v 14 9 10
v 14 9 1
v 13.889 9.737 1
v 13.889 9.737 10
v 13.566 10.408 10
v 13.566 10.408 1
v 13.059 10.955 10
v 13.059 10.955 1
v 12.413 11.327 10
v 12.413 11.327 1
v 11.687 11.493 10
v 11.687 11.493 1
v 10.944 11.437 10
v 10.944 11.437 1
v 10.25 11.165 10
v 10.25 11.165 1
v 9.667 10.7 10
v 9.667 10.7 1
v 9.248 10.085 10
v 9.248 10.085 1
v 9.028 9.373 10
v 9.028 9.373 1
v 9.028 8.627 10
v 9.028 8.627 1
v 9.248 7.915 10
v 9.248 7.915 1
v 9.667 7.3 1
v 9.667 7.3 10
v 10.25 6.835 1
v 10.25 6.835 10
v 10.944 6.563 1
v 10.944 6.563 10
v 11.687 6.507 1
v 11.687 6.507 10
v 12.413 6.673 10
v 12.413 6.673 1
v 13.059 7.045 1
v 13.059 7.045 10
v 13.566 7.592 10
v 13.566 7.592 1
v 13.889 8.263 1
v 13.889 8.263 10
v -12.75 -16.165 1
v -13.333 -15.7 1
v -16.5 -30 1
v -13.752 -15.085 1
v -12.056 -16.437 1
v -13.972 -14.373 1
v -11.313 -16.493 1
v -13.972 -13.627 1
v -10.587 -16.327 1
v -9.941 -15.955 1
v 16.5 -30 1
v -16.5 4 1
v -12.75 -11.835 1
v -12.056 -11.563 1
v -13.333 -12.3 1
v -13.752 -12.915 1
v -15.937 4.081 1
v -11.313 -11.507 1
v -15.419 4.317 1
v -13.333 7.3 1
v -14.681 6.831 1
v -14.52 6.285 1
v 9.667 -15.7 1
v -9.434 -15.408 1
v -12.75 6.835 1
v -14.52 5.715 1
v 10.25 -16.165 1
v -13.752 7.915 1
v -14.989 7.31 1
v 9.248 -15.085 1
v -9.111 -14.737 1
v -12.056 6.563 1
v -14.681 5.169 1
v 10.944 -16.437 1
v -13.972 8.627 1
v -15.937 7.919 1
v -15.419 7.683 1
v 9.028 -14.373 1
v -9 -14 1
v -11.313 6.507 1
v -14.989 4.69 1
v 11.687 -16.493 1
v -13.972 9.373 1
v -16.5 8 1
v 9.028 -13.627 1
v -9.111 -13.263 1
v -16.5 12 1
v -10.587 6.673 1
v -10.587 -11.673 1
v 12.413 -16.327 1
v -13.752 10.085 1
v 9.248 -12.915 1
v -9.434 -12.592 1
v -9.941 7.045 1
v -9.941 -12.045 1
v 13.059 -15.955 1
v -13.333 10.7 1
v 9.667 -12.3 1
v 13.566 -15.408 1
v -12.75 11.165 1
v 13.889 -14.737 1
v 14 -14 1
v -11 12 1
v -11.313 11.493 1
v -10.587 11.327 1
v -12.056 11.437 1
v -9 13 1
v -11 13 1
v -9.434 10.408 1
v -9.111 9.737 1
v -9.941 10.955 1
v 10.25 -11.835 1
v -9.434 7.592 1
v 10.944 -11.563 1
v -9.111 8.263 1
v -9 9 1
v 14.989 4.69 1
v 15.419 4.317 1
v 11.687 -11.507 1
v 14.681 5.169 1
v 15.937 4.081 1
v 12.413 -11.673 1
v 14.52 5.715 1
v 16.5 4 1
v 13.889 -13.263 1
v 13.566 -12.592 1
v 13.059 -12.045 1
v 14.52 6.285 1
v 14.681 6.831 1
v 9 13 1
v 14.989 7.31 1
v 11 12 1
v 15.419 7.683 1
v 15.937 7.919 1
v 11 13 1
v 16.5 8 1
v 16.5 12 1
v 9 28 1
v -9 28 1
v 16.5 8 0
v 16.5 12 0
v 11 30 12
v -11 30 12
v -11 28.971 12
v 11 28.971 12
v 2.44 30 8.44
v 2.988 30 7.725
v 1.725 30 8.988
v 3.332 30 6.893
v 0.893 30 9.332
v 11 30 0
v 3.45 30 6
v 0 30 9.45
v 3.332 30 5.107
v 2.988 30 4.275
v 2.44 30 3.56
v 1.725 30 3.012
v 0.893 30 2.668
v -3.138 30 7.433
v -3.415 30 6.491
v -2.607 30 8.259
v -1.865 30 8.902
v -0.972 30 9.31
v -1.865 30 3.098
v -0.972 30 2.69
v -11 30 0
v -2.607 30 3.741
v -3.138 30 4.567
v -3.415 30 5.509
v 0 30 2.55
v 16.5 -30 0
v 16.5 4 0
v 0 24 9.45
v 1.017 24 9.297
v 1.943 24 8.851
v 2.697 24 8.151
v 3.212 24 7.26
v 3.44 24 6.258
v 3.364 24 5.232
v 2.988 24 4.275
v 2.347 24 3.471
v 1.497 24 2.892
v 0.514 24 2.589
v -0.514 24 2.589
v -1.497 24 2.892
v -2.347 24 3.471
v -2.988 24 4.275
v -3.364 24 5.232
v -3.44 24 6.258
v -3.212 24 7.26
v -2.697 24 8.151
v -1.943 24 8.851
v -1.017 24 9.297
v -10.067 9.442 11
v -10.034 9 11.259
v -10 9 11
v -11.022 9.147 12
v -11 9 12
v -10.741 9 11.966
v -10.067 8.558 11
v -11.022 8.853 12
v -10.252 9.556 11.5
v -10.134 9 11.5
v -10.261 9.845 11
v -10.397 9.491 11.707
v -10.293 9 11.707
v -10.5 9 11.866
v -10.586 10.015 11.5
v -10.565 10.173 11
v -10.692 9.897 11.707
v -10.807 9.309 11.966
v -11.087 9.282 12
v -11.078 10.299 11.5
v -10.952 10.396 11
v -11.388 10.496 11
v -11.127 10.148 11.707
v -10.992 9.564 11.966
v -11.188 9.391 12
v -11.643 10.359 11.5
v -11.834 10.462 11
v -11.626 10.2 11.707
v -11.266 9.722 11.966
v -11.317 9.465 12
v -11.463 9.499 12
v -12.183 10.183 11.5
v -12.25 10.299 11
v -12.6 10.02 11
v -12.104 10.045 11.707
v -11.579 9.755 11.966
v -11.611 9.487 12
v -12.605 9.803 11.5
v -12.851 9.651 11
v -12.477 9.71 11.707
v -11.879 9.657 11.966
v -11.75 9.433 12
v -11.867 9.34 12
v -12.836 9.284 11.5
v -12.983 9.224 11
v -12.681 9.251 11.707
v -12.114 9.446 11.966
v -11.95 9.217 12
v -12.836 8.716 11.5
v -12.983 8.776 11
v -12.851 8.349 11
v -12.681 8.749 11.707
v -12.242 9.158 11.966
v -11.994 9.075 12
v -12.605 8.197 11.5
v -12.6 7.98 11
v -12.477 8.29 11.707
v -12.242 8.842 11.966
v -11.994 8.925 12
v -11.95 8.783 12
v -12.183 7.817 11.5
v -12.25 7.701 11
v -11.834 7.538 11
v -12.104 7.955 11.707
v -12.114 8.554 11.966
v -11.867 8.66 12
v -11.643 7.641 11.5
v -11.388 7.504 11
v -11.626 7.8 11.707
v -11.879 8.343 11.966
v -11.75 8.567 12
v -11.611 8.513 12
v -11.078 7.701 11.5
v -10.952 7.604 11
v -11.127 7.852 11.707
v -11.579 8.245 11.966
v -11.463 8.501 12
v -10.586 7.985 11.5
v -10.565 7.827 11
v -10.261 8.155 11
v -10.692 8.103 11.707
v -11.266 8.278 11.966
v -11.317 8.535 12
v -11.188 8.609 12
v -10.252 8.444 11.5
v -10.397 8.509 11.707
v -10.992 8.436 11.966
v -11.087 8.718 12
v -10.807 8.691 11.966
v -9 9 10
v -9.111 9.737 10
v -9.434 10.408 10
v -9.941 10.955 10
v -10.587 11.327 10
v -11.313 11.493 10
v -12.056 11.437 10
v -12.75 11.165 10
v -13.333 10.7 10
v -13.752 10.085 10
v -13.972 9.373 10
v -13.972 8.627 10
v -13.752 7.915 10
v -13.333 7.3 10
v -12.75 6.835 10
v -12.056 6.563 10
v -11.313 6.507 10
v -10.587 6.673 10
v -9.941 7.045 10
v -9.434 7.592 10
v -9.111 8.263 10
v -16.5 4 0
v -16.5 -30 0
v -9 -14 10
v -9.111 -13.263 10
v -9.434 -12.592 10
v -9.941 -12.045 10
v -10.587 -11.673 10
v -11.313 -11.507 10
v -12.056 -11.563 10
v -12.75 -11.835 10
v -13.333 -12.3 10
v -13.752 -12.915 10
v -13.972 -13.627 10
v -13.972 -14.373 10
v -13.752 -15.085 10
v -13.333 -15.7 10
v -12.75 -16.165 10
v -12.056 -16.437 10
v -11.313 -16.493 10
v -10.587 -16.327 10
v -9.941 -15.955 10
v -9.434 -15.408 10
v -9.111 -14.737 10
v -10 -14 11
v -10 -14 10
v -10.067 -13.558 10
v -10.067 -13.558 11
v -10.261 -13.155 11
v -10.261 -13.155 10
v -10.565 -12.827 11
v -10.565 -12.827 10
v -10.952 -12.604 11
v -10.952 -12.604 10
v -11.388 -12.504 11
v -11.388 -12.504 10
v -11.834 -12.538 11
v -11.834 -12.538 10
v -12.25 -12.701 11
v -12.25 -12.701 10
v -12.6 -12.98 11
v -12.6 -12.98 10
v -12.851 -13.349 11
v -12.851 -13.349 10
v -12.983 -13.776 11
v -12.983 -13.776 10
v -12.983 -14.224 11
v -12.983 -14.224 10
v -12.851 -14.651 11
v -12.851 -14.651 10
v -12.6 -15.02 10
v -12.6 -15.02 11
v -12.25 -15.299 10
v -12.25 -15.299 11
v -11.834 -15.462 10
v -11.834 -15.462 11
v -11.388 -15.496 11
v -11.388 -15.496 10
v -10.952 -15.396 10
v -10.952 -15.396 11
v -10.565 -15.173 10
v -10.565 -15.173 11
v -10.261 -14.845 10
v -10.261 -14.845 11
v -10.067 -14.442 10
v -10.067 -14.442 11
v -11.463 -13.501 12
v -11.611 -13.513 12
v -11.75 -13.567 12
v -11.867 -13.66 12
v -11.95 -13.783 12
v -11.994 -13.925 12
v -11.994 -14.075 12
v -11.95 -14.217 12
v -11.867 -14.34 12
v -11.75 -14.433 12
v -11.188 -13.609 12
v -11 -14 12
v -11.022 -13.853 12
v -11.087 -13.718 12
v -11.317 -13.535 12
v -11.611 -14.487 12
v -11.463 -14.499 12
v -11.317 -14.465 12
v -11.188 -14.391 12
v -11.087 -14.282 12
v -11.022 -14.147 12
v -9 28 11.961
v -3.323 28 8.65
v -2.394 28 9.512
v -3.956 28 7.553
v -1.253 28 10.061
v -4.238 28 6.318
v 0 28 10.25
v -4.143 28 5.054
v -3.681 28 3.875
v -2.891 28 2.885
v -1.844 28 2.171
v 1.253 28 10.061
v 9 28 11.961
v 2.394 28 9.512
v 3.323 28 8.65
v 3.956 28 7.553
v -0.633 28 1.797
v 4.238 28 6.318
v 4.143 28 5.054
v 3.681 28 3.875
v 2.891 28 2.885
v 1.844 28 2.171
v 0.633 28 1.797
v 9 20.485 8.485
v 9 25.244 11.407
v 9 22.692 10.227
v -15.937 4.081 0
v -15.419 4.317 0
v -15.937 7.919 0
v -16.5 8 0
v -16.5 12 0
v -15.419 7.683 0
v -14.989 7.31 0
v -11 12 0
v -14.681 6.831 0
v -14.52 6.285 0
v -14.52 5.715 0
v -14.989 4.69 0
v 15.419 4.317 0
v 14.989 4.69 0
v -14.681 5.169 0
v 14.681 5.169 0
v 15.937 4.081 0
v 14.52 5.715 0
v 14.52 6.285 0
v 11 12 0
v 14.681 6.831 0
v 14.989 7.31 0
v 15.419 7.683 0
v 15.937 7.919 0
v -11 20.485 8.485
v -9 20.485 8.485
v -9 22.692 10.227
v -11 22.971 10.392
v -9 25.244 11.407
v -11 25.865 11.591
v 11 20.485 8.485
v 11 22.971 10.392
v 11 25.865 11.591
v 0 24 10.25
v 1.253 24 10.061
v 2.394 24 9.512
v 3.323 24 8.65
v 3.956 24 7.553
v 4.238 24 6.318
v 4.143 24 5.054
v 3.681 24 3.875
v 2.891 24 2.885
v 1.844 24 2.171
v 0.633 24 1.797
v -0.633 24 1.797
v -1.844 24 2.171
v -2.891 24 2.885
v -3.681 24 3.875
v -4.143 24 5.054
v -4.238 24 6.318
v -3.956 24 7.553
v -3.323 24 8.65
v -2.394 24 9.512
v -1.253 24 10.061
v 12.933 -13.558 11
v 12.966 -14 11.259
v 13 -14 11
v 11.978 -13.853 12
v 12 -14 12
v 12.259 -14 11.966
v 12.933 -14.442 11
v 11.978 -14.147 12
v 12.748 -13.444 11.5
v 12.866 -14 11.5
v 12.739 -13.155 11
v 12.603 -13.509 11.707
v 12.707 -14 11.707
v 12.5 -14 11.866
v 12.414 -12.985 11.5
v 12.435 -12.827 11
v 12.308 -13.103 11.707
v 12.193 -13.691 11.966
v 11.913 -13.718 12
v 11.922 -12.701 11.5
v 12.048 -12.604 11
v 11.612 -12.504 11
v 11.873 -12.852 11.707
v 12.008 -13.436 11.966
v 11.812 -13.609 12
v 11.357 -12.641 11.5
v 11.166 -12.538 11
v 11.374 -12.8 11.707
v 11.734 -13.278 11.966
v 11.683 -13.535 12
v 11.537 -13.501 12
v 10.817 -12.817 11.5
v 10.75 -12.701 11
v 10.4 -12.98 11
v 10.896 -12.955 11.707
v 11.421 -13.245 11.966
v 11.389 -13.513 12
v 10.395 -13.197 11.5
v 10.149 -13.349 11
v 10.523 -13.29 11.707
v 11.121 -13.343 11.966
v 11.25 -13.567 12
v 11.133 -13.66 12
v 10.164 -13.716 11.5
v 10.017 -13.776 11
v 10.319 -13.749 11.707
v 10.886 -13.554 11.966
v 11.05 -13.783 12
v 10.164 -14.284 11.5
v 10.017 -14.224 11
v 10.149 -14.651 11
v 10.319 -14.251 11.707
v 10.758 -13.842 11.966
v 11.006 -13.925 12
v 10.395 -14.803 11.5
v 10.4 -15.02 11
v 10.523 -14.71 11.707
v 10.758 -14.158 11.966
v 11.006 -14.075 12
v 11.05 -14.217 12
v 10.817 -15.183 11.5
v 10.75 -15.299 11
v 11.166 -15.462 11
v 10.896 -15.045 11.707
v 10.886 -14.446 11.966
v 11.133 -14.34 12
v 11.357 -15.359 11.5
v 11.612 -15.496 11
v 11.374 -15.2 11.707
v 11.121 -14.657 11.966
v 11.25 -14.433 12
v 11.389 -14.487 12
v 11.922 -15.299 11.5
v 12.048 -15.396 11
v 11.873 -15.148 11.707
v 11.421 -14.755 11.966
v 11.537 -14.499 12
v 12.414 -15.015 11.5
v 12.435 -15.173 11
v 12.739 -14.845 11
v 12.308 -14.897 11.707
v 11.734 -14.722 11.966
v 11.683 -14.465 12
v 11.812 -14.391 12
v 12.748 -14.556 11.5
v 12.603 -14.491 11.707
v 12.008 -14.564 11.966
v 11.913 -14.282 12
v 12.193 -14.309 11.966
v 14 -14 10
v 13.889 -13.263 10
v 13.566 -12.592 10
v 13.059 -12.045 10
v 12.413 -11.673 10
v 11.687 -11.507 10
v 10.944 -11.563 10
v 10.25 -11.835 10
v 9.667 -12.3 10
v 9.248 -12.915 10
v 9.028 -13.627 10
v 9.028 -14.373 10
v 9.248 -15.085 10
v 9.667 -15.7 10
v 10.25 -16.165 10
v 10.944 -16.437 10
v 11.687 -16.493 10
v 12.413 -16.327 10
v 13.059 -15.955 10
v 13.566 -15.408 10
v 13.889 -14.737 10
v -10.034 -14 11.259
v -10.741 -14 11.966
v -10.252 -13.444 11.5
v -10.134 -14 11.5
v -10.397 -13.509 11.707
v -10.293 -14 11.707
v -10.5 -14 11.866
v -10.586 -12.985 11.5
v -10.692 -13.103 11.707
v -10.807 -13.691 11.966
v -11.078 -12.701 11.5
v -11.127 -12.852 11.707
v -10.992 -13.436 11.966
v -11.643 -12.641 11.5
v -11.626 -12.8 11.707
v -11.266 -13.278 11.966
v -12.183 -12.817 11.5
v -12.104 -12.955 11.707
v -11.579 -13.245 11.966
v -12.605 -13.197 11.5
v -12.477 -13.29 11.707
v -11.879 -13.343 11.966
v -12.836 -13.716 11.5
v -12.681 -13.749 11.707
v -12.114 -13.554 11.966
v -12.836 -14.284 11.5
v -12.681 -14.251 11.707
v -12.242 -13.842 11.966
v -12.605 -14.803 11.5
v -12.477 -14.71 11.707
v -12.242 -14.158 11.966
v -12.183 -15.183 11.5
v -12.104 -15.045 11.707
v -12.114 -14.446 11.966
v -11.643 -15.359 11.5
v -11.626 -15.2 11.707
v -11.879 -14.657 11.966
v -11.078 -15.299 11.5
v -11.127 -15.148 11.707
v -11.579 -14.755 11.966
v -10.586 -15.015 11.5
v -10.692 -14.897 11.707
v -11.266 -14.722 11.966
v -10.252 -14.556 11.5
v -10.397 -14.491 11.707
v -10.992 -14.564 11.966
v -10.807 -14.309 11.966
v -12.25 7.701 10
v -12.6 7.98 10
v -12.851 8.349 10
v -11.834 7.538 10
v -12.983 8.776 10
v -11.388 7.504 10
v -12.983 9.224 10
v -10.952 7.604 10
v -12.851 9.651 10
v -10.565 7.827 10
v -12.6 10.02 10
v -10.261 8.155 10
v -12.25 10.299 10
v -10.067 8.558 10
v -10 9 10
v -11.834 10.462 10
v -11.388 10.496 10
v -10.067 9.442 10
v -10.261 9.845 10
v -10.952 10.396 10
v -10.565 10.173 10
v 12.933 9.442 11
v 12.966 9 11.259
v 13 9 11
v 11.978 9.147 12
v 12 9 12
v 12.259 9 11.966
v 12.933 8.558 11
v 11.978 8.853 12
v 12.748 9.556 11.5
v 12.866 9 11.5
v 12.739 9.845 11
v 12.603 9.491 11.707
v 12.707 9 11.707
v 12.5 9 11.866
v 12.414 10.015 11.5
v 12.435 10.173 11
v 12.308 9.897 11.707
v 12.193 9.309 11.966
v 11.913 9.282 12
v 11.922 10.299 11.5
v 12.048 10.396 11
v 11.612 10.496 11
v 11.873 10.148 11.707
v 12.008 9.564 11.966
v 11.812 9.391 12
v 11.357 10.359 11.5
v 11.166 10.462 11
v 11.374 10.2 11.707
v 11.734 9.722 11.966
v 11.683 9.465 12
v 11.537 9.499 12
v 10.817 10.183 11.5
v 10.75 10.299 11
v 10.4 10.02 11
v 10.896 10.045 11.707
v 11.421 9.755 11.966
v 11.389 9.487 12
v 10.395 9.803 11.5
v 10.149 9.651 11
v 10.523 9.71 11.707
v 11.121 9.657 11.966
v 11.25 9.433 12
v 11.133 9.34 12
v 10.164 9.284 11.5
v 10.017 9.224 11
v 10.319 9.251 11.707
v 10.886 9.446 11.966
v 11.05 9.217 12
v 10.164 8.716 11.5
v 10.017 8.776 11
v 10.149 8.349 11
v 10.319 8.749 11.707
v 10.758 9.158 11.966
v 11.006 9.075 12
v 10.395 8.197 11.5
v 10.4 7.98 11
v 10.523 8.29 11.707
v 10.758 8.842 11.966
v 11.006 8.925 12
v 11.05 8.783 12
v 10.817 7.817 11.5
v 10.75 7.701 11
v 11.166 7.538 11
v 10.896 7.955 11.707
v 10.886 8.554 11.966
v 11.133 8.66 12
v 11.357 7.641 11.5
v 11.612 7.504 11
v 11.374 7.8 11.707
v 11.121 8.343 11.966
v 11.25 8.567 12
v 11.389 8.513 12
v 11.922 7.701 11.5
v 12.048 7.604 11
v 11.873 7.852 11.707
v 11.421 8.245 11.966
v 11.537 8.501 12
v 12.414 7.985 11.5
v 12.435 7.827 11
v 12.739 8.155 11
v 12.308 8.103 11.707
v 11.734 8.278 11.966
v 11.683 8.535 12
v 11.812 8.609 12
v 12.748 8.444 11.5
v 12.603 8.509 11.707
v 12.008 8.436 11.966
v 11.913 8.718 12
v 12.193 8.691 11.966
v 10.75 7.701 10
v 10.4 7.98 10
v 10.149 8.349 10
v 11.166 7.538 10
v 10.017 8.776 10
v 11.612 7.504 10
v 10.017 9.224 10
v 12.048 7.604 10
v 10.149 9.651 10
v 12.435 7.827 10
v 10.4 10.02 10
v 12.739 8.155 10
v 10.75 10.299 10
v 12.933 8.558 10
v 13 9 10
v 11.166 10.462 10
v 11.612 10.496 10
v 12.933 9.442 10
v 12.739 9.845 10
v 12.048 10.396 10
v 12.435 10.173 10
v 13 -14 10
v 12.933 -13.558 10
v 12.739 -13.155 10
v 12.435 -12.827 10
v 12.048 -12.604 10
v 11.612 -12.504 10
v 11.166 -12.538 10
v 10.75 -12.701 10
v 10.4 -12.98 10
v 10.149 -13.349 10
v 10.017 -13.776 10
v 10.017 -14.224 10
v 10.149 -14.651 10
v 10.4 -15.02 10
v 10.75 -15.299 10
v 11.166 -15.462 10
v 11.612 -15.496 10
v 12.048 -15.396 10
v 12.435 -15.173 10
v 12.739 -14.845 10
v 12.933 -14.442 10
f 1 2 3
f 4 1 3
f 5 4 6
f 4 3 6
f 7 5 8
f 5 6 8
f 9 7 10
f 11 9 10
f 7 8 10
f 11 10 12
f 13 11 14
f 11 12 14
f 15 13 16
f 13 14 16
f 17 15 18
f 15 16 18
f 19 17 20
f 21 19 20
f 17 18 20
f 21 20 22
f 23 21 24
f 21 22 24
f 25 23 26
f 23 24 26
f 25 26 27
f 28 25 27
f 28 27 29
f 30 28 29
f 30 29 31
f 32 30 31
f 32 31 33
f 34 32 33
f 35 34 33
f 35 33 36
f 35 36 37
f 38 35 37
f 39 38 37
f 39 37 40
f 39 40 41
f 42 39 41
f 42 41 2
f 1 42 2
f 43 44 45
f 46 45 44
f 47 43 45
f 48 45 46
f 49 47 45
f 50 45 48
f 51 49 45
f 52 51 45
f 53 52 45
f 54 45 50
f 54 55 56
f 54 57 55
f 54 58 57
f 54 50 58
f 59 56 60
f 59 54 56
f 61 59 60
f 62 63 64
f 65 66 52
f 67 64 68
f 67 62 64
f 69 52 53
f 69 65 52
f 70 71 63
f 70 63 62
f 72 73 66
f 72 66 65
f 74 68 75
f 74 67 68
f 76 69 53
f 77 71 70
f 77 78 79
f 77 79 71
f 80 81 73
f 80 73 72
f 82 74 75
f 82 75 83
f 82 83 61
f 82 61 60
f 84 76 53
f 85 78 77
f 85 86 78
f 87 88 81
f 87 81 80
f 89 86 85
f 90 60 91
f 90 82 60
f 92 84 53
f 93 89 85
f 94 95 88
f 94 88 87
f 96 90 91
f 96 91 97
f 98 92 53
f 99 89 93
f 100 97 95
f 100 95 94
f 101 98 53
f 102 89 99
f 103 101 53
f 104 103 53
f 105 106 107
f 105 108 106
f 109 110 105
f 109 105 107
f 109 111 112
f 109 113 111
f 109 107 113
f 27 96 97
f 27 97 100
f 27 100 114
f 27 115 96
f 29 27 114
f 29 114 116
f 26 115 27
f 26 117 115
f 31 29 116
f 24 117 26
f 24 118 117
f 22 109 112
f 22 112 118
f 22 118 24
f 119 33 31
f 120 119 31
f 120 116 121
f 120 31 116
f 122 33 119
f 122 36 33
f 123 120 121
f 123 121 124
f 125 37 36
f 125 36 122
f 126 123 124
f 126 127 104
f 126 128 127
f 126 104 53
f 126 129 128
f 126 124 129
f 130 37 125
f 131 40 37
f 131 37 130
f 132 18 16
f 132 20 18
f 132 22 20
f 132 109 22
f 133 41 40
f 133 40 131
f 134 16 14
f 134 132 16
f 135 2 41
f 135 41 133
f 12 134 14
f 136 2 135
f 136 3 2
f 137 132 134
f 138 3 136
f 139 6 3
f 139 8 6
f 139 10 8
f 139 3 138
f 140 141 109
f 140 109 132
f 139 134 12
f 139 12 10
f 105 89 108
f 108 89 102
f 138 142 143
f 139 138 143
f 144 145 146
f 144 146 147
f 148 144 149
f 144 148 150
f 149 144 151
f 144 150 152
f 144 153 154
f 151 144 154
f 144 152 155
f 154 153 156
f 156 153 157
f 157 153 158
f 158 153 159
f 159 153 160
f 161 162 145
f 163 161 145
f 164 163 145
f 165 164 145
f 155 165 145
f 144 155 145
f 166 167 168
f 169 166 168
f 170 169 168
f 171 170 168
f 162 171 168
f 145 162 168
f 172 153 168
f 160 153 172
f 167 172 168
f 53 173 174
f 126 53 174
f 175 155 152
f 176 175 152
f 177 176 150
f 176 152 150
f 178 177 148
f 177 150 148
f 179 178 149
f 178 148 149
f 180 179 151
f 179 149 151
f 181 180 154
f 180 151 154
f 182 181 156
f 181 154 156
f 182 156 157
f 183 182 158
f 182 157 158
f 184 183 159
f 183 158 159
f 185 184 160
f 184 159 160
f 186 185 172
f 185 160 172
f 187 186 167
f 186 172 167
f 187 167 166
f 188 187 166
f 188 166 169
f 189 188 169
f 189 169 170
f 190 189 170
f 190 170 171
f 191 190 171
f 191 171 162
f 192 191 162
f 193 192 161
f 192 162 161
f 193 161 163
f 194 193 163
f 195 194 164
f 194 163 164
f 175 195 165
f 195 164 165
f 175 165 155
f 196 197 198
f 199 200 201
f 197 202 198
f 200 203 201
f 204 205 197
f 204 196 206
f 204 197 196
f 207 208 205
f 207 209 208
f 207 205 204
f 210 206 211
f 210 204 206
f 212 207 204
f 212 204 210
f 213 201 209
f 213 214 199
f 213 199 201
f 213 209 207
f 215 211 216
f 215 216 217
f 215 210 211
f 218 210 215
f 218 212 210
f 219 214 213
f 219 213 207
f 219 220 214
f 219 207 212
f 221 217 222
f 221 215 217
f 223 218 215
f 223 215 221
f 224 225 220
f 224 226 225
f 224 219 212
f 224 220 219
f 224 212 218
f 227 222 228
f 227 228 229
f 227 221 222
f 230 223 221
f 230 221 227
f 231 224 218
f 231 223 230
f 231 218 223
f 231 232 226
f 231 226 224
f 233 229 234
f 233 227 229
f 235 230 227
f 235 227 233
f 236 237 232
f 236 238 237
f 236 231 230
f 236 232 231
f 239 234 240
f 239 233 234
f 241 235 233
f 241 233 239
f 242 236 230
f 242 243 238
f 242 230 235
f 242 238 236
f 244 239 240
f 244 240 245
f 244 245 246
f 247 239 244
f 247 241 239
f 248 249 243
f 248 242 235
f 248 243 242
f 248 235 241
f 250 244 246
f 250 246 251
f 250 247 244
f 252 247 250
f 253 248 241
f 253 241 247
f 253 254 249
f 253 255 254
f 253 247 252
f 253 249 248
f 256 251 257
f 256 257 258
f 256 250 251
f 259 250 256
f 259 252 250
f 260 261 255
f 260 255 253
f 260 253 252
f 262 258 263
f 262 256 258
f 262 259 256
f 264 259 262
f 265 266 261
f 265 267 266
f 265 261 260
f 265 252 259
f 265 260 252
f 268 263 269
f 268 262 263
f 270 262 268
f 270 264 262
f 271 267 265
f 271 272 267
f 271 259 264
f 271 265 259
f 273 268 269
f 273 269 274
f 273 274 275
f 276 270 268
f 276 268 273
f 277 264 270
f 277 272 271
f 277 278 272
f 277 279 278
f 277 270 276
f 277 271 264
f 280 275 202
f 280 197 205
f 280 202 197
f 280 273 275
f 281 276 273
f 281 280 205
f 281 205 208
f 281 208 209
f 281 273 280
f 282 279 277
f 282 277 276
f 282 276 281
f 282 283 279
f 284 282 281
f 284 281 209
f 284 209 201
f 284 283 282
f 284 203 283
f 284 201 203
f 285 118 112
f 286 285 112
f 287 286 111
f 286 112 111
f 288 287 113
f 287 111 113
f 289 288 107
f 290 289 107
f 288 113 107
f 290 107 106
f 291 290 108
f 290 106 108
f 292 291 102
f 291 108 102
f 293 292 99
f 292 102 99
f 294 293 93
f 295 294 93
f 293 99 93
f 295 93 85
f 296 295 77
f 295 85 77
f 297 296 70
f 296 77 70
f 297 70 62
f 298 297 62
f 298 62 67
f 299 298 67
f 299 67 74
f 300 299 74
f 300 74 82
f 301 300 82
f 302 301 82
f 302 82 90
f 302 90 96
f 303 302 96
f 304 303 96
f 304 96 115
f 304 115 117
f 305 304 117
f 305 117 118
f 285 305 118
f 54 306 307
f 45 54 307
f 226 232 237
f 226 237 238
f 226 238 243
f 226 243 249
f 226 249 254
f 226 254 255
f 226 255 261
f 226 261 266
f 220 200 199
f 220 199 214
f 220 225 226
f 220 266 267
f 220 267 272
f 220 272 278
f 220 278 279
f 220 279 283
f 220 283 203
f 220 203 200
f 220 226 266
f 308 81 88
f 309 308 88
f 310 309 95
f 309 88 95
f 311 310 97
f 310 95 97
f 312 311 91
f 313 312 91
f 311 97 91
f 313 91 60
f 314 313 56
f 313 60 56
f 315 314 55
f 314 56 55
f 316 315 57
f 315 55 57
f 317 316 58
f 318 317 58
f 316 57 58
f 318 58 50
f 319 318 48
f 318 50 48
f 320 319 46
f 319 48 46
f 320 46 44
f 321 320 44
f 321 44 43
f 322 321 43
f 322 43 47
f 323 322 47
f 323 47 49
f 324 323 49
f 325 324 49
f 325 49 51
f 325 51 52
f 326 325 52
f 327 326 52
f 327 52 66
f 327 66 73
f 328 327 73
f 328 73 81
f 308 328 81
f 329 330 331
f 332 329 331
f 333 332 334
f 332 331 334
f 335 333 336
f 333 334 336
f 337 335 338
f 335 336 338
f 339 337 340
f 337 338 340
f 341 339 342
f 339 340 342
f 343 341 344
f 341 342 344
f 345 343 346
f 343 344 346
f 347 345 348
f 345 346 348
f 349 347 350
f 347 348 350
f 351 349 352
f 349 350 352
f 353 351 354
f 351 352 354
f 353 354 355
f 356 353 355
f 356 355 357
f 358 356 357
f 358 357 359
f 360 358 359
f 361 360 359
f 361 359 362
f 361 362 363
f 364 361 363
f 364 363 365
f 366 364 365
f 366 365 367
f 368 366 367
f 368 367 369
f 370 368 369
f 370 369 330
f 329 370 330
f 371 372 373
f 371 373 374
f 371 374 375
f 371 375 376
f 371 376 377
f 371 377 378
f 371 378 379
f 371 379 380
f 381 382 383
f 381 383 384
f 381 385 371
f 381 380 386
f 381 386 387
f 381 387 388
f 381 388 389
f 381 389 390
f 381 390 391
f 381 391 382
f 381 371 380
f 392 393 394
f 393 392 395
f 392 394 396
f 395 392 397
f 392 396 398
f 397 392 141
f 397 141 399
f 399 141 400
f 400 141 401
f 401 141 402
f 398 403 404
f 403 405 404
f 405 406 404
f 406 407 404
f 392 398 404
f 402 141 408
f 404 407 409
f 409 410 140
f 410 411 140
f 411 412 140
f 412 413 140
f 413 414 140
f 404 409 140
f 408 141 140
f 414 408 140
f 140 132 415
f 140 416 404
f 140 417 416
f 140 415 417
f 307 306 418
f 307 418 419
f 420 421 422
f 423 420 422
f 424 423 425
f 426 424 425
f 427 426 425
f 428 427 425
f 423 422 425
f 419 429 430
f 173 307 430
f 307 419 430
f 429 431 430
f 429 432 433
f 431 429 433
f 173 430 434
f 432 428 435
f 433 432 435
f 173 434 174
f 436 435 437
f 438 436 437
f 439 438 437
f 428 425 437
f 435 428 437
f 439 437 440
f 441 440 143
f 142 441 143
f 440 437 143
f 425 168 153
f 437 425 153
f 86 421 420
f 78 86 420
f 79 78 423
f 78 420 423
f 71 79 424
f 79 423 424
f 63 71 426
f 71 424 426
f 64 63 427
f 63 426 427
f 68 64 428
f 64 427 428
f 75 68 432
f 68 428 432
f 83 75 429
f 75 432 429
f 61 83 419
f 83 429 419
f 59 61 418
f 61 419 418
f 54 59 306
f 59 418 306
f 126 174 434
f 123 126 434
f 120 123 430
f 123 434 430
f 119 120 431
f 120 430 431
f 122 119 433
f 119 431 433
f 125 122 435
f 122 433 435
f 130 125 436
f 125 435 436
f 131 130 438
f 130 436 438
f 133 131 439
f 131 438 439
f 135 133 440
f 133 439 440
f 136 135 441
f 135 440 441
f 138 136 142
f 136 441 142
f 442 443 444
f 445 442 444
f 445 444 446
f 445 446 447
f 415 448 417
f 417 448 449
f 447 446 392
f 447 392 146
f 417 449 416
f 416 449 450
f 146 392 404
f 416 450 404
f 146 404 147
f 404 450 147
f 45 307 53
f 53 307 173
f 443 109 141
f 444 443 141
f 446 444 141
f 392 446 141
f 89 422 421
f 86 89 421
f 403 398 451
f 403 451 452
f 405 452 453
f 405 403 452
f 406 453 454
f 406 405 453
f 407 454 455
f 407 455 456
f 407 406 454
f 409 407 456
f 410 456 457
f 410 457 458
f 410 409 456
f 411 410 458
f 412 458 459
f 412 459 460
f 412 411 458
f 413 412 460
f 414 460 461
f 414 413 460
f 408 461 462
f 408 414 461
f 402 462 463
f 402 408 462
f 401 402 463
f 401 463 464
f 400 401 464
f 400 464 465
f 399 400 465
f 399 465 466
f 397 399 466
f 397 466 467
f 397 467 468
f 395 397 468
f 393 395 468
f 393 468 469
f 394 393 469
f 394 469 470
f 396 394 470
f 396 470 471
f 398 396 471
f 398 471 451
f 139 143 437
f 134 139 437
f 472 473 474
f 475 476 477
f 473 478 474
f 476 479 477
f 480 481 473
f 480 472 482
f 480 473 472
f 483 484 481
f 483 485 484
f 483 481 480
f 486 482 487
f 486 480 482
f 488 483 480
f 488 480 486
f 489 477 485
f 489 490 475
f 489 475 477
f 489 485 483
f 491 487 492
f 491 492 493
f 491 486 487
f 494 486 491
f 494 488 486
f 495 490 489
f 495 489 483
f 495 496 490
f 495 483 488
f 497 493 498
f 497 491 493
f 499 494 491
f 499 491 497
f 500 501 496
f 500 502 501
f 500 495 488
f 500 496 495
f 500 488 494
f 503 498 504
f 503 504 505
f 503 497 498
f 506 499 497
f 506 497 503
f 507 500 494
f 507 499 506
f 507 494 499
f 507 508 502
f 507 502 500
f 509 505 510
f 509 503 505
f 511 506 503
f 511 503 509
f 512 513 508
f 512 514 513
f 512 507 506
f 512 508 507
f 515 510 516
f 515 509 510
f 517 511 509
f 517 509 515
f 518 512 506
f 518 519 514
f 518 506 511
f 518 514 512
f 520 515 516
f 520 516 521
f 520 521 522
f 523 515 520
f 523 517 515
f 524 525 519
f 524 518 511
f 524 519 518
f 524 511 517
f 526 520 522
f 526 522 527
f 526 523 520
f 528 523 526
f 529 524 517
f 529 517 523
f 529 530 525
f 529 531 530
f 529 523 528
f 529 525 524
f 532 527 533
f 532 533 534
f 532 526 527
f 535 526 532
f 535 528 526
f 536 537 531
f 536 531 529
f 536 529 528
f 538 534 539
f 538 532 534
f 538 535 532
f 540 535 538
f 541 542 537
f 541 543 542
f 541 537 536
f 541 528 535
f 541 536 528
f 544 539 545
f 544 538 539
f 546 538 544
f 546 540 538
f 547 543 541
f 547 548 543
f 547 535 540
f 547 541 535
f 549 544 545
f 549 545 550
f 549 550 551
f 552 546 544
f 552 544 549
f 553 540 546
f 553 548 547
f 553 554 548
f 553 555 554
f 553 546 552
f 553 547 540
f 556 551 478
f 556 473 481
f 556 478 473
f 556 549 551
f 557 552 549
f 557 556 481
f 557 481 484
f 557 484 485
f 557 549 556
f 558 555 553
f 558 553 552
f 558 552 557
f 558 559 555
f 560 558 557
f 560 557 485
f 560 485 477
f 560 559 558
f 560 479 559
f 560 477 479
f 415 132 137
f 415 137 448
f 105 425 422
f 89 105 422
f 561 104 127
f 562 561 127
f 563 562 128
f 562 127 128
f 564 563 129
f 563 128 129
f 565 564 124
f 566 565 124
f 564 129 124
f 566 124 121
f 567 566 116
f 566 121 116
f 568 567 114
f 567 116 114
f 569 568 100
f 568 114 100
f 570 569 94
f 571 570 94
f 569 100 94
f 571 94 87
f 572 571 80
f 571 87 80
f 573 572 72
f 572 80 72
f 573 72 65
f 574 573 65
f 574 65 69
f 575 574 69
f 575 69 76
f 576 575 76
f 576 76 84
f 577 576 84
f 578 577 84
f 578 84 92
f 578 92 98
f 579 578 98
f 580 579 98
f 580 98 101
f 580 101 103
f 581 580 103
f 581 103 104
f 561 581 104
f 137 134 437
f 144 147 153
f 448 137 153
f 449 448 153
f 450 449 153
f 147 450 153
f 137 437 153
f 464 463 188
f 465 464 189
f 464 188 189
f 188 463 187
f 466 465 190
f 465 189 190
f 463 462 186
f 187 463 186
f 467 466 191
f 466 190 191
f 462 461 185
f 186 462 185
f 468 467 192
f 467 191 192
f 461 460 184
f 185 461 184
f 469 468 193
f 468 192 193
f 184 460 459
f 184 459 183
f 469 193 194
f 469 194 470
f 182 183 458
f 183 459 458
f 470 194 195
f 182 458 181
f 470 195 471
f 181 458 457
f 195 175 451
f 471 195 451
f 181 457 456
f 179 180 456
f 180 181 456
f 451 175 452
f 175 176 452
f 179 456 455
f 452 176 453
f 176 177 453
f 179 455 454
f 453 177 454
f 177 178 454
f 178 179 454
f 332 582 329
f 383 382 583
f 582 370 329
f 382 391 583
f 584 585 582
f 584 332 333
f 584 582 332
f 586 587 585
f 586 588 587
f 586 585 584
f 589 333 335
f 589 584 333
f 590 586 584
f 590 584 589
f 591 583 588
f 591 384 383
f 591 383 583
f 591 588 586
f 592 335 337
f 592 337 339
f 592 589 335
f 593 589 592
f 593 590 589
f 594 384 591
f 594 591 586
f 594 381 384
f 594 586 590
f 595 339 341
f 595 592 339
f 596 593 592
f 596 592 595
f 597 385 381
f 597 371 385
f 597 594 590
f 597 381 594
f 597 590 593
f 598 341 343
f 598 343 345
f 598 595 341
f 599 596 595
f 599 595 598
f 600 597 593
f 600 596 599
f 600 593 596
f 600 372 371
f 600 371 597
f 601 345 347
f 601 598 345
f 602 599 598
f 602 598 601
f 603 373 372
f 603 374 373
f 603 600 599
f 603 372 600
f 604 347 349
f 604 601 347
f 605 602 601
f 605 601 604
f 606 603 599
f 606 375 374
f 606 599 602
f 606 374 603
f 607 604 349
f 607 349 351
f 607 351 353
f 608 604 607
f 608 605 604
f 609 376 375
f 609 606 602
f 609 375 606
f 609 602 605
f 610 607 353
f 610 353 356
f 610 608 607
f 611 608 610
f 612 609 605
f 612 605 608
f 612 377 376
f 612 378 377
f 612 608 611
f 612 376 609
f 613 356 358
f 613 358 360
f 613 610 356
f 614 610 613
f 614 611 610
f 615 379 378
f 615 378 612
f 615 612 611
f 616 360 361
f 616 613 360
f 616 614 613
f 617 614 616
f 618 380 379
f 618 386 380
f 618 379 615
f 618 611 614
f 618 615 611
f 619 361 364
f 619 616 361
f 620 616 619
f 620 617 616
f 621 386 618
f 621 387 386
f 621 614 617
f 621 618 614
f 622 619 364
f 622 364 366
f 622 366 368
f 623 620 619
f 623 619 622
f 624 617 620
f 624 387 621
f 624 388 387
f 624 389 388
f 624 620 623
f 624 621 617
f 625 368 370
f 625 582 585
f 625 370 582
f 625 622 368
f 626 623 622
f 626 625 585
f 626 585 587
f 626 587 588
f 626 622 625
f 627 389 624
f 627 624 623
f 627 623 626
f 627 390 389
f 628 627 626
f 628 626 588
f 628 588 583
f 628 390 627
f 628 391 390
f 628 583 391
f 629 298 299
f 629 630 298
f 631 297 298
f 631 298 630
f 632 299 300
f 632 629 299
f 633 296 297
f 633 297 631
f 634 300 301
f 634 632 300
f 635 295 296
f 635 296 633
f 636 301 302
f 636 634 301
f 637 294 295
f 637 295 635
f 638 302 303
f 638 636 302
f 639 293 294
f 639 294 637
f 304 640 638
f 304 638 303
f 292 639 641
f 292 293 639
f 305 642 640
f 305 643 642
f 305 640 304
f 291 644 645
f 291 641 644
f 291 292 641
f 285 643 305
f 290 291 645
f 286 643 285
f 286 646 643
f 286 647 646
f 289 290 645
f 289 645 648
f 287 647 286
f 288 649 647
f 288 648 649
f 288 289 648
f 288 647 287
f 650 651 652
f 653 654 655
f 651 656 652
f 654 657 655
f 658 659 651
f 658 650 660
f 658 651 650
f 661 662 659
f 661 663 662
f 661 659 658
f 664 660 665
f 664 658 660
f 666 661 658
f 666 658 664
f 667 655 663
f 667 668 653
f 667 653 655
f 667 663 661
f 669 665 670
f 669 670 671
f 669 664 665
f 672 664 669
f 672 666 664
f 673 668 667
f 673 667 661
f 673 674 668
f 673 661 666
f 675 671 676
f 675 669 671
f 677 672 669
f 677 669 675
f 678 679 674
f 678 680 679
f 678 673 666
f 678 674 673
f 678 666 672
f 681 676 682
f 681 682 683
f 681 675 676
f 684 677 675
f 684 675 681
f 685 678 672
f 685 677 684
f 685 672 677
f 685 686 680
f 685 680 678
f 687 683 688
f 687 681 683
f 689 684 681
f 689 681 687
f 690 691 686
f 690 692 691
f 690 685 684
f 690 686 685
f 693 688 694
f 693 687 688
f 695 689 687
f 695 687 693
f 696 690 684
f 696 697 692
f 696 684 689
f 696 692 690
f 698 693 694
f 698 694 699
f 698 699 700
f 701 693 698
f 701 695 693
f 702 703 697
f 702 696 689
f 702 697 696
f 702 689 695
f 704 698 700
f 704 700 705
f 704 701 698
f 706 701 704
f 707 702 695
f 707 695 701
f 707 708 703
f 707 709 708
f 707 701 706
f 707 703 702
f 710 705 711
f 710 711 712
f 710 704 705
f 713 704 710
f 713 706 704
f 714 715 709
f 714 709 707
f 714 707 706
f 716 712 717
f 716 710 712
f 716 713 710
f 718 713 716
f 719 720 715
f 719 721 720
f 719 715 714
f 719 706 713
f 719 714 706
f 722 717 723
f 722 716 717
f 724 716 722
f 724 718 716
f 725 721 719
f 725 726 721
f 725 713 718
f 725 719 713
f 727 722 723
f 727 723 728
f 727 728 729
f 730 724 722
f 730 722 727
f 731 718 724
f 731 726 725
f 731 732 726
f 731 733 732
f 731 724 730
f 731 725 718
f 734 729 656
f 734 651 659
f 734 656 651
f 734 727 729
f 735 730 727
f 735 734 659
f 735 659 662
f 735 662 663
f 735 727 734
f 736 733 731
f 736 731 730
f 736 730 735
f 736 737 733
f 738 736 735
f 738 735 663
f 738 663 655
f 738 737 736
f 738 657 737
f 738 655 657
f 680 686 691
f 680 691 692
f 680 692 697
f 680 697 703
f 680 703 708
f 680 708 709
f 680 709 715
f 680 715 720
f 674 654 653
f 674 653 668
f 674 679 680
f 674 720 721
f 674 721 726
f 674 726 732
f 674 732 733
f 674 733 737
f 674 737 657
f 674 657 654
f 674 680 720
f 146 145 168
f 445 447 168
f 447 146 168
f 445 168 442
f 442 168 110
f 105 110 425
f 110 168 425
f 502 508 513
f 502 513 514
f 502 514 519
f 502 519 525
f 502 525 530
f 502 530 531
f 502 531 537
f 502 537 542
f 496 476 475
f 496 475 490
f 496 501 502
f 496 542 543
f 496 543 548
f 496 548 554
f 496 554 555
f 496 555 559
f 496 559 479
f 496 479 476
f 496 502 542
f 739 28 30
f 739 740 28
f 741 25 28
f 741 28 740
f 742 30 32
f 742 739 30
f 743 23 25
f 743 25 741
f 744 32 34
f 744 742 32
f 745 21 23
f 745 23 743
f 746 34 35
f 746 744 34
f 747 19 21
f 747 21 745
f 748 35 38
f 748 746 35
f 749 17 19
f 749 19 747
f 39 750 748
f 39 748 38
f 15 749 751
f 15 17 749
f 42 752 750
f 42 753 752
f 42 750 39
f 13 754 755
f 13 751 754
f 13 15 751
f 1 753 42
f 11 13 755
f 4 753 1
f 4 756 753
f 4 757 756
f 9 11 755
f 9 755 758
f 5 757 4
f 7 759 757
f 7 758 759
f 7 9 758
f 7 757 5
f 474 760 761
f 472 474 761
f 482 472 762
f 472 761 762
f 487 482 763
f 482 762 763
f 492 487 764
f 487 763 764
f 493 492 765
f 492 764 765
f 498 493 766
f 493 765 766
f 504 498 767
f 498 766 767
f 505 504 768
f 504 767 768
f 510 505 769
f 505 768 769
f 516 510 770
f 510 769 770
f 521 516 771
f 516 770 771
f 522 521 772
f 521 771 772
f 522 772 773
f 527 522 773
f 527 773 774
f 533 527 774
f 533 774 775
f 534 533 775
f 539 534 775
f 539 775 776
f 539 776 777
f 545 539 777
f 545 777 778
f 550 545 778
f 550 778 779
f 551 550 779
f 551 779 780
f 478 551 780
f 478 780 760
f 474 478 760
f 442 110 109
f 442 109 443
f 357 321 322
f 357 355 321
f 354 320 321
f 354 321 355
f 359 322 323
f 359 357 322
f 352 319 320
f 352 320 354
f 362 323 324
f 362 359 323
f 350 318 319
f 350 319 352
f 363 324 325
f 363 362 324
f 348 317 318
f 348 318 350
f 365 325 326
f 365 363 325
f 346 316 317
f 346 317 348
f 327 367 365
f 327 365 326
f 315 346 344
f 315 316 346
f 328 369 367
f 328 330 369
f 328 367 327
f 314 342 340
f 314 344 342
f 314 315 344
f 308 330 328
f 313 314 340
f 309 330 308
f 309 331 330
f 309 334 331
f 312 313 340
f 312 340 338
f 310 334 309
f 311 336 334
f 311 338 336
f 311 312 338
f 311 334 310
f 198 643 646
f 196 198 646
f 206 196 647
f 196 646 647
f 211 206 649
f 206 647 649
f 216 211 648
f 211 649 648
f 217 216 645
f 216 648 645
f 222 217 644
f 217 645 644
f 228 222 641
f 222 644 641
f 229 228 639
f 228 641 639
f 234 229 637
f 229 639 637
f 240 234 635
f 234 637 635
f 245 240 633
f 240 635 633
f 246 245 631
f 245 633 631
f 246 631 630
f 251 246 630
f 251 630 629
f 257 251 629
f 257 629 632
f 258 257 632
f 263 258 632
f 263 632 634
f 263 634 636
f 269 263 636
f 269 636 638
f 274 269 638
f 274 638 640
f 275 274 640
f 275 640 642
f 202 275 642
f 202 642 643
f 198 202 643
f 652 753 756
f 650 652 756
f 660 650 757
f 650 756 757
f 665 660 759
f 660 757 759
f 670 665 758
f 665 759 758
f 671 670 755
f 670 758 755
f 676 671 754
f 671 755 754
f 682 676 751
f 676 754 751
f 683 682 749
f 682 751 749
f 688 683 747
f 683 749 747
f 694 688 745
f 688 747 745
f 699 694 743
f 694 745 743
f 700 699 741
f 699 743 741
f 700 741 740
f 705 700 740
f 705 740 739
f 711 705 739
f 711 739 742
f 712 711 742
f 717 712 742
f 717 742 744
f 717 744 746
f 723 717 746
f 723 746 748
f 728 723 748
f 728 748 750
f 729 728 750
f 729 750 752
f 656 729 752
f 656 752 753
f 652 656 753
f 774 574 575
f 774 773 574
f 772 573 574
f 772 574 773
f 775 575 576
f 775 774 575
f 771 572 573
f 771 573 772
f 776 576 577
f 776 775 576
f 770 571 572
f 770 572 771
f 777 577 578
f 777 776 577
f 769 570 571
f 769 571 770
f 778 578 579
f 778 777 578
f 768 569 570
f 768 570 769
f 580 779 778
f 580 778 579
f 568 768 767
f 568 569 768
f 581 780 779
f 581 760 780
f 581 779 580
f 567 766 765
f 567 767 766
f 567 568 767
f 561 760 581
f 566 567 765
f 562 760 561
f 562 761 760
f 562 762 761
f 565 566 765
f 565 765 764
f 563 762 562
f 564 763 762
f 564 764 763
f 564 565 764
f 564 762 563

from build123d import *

# Parameters (mm, degrees)
SKIZZE1_R                        = 2.5
AUFSATZ_LINEAR_AUSTRAGEN4_DEPTH  = 1
SKIZZE1_3_R                      = 2.5
SKIZZE1_3_R_2                    = 1.5
AUFSATZ_LINEAR_AUSTRAGEN5_DEPTH  = 10
SKIZZE1_4_R                      = 1.5
AUFSATZ_LINEAR_AUSTRAGEN6_DEPTH  = 12
VERRUNDUNG4_R                    = 1
SKIZZE1_5_W                      = 2
SKIZZE1_5_H                      = 16
AUFSATZ_LINEAR_AUSTRAGEN7_DEPTH  = 12
FASE3_SIZE                       = 12
VERRUNDUNG5_R                    = 12
SCHNITT_LINEAR_AUSTRAGEN2_DEPTH  = 12
SKIZZE5_4_R                      = 4.25
SKIZZE5_4_R_2                    = 3.45
AUFSATZ_LINEAR_AUSTRAGEN10_DEPTH = 6


with BuildPart() as part:
    # Skizze1 → Aufsatz-Linear austragen4 (new body)
    with BuildSketch(Plane.XY):
        with BuildLine():
            Line((-11, 12), (-16.5, 12))
            Line((-16.5, 12), (-16.5, 8))
            ThreePointArc((-16.5, 8), (-14.5, 6), (-16.5, 4))
            Line((-16.5, 4), (-16.5, -30))
            Line((-16.5, -30), (16.5, -30))
            Line((16.5, -30), (16.5, 4))
            ThreePointArc((16.5, 4), (14.5, 6), (16.5, 8))
            Line((16.5, 8), (16.5, 12))
            Line((16.5, 12), (11, 12))
            Line((11, 12), (9, 12))
            Line((9, 12), (9, 28))
            Line((9, 28), (-9, 28))
            Line((-9, 28), (-9, 12))
            Line((-9, 12), (-11, 12))
        make_face()
        with Locations((-11.5, -14)):
            Circle(SKIZZE1_R, mode=Mode.SUBTRACT)
        with Locations((11.5, -14)):
            Circle(SKIZZE1_R, mode=Mode.SUBTRACT)
        with Locations((-11.5, 9)):
            Circle(SKIZZE1_R, mode=Mode.SUBTRACT)
        with Locations((11.5, 9)):
            Circle(SKIZZE1_R, mode=Mode.SUBTRACT)
    extrude(amount=AUFSATZ_LINEAR_AUSTRAGEN4_DEPTH)

    # Skizze1<3> → Aufsatz-Linear austragen5 (add)
    # profile 1 of 4: a face of its own
    with BuildSketch(Plane.XY):
        with Locations((11.5, 9)):
            Circle(SKIZZE1_3_R)
        with Locations((11.5, 9)):
            Circle(SKIZZE1_3_R_2, mode=Mode.SUBTRACT)
    # profile 2 of 4: a face of its own
    with BuildSketch(Plane.XY):
        with Locations((-11.5, 9)):
            Circle(SKIZZE1_3_R)
        with Locations((-11.5, 9)):
            Circle(SKIZZE1_3_R_2, mode=Mode.SUBTRACT)
    # profile 3 of 4: a face of its own
    with BuildSketch(Plane.XY):
        with Locations((-11.5, -14)):
            Circle(SKIZZE1_3_R)
        with Locations((-11.5, -14)):
            Circle(SKIZZE1_3_R_2, mode=Mode.SUBTRACT)
    # profile 4 of 4: a face of its own
    with BuildSketch(Plane.XY):
        with Locations((11.5, -14)):
            Circle(SKIZZE1_3_R)
        with Locations((11.5, -14)):
            Circle(SKIZZE1_3_R_2, mode=Mode.SUBTRACT)
    extrude(amount=AUFSATZ_LINEAR_AUSTRAGEN5_DEPTH)

    # Skizze1<4> → Aufsatz-Linear austragen6 (add)
    with BuildSketch(Plane.XY):
        with Locations((-11.5, 9)):
            Circle(SKIZZE1_4_R)
        with Locations((11.5, 9)):
            Circle(SKIZZE1_4_R)
        with Locations((-11.5, -14)):
            Circle(SKIZZE1_4_R)
        with Locations((11.5, -14)):
            Circle(SKIZZE1_4_R)
    extrude(amount=AUFSATZ_LINEAR_AUSTRAGEN6_DEPTH)

    # Verrundung4
    verrundung4_edges = [part.edges().sort_by_distance(p)[0] for p in [
        (-13, 9, 12),
        (10, 9, 12),
        (-13, -14, 12),
        (10, -14, 12),
    ]]
    fillet(verrundung4_edges, radius=VERRUNDUNG4_R)

    # Skizze1<5> → Aufsatz-Linear austragen7 (add)
    with BuildSketch(Plane.XY):
        with Locations((-10, 20)):
            Rectangle(SKIZZE1_5_W, SKIZZE1_5_H)
        Polygon((11, 30), (-11, 30), (-11, 28), (-9, 28), (9, 28), (11, 28), align=None)
        with Locations((10, 20)):
            Rectangle(SKIZZE1_5_W, SKIZZE1_5_H)
    extrude(amount=AUFSATZ_LINEAR_AUSTRAGEN7_DEPTH)

    # Fase3
    # the kernel refuses this chamfer: 12 mm, written as the material it takes off along each edge
    with BuildSketch(Plane(origin=(-41.860195856, 12, 12), x_dir=(0, -0.027495876610586348, -0.9996219169112968), z_dir=(1, 0, 0))) as fase3_piece_1_section:
        Polygon((FASE3_SIZE * 0.999621916911, FASE3_SIZE * 0.0274958766106), (-FASE3_SIZE * 0.0274958766106, FASE3_SIZE * 0.999621916911), (0, 0), align=None)
    fase3_piece_1 = extrude(amount=63.720391711, mode=Mode.PRIVATE)
    fase3_piece_1 = split(fase3_piece_1, bisect_by=Plane(origin=(-10, 16.015873454, 1), z_dir=(0, 0, 1)), keep=Keep.TOP, mode=Mode.PRIVATE)
    add(fase3_piece_1, mode=Mode.SUBTRACT)
    with BuildSketch(Plane(origin=(-21.860195856, 12, 12), x_dir=(0, -0.027495876610586348, -0.9996219169112968), z_dir=(1, 0, 0))) as fase3_piece_2_section:
        Polygon((FASE3_SIZE * 0.999621916911, FASE3_SIZE * 0.0274958766106), (-FASE3_SIZE * 0.0274958766106, FASE3_SIZE * 0.999621916911), (0, 0), align=None)
    fase3_piece_2 = extrude(amount=63.720391711, mode=Mode.PRIVATE)
    fase3_piece_2 = split(fase3_piece_2, bisect_by=Plane(origin=(10, 16.015873454, 1), z_dir=(0, 0, 1)), keep=Keep.TOP, mode=Mode.PRIVATE)
    add(fase3_piece_2, mode=Mode.SUBTRACT)

    # Verrundung5
    verrundung5_edges = [part.edges().sort_by_distance(p)[0] for p in [
        (-10, 24, 12),
    ]]
    fillet(verrundung5_edges, radius=VERRUNDUNG5_R)

    # Skizze5 → Schnitt-Linear austragen2 (cut)
    with BuildSketch(Plane(origin=(0, 30, 0), x_dir=(1, 0, 0), z_dir=(0, 1, 0))):
        with BuildLine():
            ThreePointArc((3.45, -6), (2.439518395, -3.560481605), (0, -2.55))
            Line((0, -2.55), (0, -9.45))
            ThreePointArc((0, -9.45), (2.439518395, -8.439518395), (3.45, -6))
        make_face()
        with BuildLine():
            Line((0, -9.45), (0, -2.55))
            ThreePointArc((0, -2.55), (-3.45, -6), (0, -9.45))
        make_face()
    extrude(amount=-SCHNITT_LINEAR_AUSTRAGEN2_DEPTH, mode=Mode.SUBTRACT)

    # Skizze5<4> → Aufsatz-Linear austragen10 (add)
    with BuildSketch(Plane(origin=(0, 30, 0), x_dir=(1, 0, 0), z_dir=(0, 1, 0))):
        with Locations(Location((0, -6, 0), (0, 0, 270))):
            Circle(SKIZZE5_4_R)
        with Locations(Location((0, -6, 0), (0, 0, 270))):
            Circle(SKIZZE5_4_R_2, mode=Mode.SUBTRACT)
    extrude(amount=-AUFSATZ_LINEAR_AUSTRAGEN10_DEPTH)


solid = part.part
